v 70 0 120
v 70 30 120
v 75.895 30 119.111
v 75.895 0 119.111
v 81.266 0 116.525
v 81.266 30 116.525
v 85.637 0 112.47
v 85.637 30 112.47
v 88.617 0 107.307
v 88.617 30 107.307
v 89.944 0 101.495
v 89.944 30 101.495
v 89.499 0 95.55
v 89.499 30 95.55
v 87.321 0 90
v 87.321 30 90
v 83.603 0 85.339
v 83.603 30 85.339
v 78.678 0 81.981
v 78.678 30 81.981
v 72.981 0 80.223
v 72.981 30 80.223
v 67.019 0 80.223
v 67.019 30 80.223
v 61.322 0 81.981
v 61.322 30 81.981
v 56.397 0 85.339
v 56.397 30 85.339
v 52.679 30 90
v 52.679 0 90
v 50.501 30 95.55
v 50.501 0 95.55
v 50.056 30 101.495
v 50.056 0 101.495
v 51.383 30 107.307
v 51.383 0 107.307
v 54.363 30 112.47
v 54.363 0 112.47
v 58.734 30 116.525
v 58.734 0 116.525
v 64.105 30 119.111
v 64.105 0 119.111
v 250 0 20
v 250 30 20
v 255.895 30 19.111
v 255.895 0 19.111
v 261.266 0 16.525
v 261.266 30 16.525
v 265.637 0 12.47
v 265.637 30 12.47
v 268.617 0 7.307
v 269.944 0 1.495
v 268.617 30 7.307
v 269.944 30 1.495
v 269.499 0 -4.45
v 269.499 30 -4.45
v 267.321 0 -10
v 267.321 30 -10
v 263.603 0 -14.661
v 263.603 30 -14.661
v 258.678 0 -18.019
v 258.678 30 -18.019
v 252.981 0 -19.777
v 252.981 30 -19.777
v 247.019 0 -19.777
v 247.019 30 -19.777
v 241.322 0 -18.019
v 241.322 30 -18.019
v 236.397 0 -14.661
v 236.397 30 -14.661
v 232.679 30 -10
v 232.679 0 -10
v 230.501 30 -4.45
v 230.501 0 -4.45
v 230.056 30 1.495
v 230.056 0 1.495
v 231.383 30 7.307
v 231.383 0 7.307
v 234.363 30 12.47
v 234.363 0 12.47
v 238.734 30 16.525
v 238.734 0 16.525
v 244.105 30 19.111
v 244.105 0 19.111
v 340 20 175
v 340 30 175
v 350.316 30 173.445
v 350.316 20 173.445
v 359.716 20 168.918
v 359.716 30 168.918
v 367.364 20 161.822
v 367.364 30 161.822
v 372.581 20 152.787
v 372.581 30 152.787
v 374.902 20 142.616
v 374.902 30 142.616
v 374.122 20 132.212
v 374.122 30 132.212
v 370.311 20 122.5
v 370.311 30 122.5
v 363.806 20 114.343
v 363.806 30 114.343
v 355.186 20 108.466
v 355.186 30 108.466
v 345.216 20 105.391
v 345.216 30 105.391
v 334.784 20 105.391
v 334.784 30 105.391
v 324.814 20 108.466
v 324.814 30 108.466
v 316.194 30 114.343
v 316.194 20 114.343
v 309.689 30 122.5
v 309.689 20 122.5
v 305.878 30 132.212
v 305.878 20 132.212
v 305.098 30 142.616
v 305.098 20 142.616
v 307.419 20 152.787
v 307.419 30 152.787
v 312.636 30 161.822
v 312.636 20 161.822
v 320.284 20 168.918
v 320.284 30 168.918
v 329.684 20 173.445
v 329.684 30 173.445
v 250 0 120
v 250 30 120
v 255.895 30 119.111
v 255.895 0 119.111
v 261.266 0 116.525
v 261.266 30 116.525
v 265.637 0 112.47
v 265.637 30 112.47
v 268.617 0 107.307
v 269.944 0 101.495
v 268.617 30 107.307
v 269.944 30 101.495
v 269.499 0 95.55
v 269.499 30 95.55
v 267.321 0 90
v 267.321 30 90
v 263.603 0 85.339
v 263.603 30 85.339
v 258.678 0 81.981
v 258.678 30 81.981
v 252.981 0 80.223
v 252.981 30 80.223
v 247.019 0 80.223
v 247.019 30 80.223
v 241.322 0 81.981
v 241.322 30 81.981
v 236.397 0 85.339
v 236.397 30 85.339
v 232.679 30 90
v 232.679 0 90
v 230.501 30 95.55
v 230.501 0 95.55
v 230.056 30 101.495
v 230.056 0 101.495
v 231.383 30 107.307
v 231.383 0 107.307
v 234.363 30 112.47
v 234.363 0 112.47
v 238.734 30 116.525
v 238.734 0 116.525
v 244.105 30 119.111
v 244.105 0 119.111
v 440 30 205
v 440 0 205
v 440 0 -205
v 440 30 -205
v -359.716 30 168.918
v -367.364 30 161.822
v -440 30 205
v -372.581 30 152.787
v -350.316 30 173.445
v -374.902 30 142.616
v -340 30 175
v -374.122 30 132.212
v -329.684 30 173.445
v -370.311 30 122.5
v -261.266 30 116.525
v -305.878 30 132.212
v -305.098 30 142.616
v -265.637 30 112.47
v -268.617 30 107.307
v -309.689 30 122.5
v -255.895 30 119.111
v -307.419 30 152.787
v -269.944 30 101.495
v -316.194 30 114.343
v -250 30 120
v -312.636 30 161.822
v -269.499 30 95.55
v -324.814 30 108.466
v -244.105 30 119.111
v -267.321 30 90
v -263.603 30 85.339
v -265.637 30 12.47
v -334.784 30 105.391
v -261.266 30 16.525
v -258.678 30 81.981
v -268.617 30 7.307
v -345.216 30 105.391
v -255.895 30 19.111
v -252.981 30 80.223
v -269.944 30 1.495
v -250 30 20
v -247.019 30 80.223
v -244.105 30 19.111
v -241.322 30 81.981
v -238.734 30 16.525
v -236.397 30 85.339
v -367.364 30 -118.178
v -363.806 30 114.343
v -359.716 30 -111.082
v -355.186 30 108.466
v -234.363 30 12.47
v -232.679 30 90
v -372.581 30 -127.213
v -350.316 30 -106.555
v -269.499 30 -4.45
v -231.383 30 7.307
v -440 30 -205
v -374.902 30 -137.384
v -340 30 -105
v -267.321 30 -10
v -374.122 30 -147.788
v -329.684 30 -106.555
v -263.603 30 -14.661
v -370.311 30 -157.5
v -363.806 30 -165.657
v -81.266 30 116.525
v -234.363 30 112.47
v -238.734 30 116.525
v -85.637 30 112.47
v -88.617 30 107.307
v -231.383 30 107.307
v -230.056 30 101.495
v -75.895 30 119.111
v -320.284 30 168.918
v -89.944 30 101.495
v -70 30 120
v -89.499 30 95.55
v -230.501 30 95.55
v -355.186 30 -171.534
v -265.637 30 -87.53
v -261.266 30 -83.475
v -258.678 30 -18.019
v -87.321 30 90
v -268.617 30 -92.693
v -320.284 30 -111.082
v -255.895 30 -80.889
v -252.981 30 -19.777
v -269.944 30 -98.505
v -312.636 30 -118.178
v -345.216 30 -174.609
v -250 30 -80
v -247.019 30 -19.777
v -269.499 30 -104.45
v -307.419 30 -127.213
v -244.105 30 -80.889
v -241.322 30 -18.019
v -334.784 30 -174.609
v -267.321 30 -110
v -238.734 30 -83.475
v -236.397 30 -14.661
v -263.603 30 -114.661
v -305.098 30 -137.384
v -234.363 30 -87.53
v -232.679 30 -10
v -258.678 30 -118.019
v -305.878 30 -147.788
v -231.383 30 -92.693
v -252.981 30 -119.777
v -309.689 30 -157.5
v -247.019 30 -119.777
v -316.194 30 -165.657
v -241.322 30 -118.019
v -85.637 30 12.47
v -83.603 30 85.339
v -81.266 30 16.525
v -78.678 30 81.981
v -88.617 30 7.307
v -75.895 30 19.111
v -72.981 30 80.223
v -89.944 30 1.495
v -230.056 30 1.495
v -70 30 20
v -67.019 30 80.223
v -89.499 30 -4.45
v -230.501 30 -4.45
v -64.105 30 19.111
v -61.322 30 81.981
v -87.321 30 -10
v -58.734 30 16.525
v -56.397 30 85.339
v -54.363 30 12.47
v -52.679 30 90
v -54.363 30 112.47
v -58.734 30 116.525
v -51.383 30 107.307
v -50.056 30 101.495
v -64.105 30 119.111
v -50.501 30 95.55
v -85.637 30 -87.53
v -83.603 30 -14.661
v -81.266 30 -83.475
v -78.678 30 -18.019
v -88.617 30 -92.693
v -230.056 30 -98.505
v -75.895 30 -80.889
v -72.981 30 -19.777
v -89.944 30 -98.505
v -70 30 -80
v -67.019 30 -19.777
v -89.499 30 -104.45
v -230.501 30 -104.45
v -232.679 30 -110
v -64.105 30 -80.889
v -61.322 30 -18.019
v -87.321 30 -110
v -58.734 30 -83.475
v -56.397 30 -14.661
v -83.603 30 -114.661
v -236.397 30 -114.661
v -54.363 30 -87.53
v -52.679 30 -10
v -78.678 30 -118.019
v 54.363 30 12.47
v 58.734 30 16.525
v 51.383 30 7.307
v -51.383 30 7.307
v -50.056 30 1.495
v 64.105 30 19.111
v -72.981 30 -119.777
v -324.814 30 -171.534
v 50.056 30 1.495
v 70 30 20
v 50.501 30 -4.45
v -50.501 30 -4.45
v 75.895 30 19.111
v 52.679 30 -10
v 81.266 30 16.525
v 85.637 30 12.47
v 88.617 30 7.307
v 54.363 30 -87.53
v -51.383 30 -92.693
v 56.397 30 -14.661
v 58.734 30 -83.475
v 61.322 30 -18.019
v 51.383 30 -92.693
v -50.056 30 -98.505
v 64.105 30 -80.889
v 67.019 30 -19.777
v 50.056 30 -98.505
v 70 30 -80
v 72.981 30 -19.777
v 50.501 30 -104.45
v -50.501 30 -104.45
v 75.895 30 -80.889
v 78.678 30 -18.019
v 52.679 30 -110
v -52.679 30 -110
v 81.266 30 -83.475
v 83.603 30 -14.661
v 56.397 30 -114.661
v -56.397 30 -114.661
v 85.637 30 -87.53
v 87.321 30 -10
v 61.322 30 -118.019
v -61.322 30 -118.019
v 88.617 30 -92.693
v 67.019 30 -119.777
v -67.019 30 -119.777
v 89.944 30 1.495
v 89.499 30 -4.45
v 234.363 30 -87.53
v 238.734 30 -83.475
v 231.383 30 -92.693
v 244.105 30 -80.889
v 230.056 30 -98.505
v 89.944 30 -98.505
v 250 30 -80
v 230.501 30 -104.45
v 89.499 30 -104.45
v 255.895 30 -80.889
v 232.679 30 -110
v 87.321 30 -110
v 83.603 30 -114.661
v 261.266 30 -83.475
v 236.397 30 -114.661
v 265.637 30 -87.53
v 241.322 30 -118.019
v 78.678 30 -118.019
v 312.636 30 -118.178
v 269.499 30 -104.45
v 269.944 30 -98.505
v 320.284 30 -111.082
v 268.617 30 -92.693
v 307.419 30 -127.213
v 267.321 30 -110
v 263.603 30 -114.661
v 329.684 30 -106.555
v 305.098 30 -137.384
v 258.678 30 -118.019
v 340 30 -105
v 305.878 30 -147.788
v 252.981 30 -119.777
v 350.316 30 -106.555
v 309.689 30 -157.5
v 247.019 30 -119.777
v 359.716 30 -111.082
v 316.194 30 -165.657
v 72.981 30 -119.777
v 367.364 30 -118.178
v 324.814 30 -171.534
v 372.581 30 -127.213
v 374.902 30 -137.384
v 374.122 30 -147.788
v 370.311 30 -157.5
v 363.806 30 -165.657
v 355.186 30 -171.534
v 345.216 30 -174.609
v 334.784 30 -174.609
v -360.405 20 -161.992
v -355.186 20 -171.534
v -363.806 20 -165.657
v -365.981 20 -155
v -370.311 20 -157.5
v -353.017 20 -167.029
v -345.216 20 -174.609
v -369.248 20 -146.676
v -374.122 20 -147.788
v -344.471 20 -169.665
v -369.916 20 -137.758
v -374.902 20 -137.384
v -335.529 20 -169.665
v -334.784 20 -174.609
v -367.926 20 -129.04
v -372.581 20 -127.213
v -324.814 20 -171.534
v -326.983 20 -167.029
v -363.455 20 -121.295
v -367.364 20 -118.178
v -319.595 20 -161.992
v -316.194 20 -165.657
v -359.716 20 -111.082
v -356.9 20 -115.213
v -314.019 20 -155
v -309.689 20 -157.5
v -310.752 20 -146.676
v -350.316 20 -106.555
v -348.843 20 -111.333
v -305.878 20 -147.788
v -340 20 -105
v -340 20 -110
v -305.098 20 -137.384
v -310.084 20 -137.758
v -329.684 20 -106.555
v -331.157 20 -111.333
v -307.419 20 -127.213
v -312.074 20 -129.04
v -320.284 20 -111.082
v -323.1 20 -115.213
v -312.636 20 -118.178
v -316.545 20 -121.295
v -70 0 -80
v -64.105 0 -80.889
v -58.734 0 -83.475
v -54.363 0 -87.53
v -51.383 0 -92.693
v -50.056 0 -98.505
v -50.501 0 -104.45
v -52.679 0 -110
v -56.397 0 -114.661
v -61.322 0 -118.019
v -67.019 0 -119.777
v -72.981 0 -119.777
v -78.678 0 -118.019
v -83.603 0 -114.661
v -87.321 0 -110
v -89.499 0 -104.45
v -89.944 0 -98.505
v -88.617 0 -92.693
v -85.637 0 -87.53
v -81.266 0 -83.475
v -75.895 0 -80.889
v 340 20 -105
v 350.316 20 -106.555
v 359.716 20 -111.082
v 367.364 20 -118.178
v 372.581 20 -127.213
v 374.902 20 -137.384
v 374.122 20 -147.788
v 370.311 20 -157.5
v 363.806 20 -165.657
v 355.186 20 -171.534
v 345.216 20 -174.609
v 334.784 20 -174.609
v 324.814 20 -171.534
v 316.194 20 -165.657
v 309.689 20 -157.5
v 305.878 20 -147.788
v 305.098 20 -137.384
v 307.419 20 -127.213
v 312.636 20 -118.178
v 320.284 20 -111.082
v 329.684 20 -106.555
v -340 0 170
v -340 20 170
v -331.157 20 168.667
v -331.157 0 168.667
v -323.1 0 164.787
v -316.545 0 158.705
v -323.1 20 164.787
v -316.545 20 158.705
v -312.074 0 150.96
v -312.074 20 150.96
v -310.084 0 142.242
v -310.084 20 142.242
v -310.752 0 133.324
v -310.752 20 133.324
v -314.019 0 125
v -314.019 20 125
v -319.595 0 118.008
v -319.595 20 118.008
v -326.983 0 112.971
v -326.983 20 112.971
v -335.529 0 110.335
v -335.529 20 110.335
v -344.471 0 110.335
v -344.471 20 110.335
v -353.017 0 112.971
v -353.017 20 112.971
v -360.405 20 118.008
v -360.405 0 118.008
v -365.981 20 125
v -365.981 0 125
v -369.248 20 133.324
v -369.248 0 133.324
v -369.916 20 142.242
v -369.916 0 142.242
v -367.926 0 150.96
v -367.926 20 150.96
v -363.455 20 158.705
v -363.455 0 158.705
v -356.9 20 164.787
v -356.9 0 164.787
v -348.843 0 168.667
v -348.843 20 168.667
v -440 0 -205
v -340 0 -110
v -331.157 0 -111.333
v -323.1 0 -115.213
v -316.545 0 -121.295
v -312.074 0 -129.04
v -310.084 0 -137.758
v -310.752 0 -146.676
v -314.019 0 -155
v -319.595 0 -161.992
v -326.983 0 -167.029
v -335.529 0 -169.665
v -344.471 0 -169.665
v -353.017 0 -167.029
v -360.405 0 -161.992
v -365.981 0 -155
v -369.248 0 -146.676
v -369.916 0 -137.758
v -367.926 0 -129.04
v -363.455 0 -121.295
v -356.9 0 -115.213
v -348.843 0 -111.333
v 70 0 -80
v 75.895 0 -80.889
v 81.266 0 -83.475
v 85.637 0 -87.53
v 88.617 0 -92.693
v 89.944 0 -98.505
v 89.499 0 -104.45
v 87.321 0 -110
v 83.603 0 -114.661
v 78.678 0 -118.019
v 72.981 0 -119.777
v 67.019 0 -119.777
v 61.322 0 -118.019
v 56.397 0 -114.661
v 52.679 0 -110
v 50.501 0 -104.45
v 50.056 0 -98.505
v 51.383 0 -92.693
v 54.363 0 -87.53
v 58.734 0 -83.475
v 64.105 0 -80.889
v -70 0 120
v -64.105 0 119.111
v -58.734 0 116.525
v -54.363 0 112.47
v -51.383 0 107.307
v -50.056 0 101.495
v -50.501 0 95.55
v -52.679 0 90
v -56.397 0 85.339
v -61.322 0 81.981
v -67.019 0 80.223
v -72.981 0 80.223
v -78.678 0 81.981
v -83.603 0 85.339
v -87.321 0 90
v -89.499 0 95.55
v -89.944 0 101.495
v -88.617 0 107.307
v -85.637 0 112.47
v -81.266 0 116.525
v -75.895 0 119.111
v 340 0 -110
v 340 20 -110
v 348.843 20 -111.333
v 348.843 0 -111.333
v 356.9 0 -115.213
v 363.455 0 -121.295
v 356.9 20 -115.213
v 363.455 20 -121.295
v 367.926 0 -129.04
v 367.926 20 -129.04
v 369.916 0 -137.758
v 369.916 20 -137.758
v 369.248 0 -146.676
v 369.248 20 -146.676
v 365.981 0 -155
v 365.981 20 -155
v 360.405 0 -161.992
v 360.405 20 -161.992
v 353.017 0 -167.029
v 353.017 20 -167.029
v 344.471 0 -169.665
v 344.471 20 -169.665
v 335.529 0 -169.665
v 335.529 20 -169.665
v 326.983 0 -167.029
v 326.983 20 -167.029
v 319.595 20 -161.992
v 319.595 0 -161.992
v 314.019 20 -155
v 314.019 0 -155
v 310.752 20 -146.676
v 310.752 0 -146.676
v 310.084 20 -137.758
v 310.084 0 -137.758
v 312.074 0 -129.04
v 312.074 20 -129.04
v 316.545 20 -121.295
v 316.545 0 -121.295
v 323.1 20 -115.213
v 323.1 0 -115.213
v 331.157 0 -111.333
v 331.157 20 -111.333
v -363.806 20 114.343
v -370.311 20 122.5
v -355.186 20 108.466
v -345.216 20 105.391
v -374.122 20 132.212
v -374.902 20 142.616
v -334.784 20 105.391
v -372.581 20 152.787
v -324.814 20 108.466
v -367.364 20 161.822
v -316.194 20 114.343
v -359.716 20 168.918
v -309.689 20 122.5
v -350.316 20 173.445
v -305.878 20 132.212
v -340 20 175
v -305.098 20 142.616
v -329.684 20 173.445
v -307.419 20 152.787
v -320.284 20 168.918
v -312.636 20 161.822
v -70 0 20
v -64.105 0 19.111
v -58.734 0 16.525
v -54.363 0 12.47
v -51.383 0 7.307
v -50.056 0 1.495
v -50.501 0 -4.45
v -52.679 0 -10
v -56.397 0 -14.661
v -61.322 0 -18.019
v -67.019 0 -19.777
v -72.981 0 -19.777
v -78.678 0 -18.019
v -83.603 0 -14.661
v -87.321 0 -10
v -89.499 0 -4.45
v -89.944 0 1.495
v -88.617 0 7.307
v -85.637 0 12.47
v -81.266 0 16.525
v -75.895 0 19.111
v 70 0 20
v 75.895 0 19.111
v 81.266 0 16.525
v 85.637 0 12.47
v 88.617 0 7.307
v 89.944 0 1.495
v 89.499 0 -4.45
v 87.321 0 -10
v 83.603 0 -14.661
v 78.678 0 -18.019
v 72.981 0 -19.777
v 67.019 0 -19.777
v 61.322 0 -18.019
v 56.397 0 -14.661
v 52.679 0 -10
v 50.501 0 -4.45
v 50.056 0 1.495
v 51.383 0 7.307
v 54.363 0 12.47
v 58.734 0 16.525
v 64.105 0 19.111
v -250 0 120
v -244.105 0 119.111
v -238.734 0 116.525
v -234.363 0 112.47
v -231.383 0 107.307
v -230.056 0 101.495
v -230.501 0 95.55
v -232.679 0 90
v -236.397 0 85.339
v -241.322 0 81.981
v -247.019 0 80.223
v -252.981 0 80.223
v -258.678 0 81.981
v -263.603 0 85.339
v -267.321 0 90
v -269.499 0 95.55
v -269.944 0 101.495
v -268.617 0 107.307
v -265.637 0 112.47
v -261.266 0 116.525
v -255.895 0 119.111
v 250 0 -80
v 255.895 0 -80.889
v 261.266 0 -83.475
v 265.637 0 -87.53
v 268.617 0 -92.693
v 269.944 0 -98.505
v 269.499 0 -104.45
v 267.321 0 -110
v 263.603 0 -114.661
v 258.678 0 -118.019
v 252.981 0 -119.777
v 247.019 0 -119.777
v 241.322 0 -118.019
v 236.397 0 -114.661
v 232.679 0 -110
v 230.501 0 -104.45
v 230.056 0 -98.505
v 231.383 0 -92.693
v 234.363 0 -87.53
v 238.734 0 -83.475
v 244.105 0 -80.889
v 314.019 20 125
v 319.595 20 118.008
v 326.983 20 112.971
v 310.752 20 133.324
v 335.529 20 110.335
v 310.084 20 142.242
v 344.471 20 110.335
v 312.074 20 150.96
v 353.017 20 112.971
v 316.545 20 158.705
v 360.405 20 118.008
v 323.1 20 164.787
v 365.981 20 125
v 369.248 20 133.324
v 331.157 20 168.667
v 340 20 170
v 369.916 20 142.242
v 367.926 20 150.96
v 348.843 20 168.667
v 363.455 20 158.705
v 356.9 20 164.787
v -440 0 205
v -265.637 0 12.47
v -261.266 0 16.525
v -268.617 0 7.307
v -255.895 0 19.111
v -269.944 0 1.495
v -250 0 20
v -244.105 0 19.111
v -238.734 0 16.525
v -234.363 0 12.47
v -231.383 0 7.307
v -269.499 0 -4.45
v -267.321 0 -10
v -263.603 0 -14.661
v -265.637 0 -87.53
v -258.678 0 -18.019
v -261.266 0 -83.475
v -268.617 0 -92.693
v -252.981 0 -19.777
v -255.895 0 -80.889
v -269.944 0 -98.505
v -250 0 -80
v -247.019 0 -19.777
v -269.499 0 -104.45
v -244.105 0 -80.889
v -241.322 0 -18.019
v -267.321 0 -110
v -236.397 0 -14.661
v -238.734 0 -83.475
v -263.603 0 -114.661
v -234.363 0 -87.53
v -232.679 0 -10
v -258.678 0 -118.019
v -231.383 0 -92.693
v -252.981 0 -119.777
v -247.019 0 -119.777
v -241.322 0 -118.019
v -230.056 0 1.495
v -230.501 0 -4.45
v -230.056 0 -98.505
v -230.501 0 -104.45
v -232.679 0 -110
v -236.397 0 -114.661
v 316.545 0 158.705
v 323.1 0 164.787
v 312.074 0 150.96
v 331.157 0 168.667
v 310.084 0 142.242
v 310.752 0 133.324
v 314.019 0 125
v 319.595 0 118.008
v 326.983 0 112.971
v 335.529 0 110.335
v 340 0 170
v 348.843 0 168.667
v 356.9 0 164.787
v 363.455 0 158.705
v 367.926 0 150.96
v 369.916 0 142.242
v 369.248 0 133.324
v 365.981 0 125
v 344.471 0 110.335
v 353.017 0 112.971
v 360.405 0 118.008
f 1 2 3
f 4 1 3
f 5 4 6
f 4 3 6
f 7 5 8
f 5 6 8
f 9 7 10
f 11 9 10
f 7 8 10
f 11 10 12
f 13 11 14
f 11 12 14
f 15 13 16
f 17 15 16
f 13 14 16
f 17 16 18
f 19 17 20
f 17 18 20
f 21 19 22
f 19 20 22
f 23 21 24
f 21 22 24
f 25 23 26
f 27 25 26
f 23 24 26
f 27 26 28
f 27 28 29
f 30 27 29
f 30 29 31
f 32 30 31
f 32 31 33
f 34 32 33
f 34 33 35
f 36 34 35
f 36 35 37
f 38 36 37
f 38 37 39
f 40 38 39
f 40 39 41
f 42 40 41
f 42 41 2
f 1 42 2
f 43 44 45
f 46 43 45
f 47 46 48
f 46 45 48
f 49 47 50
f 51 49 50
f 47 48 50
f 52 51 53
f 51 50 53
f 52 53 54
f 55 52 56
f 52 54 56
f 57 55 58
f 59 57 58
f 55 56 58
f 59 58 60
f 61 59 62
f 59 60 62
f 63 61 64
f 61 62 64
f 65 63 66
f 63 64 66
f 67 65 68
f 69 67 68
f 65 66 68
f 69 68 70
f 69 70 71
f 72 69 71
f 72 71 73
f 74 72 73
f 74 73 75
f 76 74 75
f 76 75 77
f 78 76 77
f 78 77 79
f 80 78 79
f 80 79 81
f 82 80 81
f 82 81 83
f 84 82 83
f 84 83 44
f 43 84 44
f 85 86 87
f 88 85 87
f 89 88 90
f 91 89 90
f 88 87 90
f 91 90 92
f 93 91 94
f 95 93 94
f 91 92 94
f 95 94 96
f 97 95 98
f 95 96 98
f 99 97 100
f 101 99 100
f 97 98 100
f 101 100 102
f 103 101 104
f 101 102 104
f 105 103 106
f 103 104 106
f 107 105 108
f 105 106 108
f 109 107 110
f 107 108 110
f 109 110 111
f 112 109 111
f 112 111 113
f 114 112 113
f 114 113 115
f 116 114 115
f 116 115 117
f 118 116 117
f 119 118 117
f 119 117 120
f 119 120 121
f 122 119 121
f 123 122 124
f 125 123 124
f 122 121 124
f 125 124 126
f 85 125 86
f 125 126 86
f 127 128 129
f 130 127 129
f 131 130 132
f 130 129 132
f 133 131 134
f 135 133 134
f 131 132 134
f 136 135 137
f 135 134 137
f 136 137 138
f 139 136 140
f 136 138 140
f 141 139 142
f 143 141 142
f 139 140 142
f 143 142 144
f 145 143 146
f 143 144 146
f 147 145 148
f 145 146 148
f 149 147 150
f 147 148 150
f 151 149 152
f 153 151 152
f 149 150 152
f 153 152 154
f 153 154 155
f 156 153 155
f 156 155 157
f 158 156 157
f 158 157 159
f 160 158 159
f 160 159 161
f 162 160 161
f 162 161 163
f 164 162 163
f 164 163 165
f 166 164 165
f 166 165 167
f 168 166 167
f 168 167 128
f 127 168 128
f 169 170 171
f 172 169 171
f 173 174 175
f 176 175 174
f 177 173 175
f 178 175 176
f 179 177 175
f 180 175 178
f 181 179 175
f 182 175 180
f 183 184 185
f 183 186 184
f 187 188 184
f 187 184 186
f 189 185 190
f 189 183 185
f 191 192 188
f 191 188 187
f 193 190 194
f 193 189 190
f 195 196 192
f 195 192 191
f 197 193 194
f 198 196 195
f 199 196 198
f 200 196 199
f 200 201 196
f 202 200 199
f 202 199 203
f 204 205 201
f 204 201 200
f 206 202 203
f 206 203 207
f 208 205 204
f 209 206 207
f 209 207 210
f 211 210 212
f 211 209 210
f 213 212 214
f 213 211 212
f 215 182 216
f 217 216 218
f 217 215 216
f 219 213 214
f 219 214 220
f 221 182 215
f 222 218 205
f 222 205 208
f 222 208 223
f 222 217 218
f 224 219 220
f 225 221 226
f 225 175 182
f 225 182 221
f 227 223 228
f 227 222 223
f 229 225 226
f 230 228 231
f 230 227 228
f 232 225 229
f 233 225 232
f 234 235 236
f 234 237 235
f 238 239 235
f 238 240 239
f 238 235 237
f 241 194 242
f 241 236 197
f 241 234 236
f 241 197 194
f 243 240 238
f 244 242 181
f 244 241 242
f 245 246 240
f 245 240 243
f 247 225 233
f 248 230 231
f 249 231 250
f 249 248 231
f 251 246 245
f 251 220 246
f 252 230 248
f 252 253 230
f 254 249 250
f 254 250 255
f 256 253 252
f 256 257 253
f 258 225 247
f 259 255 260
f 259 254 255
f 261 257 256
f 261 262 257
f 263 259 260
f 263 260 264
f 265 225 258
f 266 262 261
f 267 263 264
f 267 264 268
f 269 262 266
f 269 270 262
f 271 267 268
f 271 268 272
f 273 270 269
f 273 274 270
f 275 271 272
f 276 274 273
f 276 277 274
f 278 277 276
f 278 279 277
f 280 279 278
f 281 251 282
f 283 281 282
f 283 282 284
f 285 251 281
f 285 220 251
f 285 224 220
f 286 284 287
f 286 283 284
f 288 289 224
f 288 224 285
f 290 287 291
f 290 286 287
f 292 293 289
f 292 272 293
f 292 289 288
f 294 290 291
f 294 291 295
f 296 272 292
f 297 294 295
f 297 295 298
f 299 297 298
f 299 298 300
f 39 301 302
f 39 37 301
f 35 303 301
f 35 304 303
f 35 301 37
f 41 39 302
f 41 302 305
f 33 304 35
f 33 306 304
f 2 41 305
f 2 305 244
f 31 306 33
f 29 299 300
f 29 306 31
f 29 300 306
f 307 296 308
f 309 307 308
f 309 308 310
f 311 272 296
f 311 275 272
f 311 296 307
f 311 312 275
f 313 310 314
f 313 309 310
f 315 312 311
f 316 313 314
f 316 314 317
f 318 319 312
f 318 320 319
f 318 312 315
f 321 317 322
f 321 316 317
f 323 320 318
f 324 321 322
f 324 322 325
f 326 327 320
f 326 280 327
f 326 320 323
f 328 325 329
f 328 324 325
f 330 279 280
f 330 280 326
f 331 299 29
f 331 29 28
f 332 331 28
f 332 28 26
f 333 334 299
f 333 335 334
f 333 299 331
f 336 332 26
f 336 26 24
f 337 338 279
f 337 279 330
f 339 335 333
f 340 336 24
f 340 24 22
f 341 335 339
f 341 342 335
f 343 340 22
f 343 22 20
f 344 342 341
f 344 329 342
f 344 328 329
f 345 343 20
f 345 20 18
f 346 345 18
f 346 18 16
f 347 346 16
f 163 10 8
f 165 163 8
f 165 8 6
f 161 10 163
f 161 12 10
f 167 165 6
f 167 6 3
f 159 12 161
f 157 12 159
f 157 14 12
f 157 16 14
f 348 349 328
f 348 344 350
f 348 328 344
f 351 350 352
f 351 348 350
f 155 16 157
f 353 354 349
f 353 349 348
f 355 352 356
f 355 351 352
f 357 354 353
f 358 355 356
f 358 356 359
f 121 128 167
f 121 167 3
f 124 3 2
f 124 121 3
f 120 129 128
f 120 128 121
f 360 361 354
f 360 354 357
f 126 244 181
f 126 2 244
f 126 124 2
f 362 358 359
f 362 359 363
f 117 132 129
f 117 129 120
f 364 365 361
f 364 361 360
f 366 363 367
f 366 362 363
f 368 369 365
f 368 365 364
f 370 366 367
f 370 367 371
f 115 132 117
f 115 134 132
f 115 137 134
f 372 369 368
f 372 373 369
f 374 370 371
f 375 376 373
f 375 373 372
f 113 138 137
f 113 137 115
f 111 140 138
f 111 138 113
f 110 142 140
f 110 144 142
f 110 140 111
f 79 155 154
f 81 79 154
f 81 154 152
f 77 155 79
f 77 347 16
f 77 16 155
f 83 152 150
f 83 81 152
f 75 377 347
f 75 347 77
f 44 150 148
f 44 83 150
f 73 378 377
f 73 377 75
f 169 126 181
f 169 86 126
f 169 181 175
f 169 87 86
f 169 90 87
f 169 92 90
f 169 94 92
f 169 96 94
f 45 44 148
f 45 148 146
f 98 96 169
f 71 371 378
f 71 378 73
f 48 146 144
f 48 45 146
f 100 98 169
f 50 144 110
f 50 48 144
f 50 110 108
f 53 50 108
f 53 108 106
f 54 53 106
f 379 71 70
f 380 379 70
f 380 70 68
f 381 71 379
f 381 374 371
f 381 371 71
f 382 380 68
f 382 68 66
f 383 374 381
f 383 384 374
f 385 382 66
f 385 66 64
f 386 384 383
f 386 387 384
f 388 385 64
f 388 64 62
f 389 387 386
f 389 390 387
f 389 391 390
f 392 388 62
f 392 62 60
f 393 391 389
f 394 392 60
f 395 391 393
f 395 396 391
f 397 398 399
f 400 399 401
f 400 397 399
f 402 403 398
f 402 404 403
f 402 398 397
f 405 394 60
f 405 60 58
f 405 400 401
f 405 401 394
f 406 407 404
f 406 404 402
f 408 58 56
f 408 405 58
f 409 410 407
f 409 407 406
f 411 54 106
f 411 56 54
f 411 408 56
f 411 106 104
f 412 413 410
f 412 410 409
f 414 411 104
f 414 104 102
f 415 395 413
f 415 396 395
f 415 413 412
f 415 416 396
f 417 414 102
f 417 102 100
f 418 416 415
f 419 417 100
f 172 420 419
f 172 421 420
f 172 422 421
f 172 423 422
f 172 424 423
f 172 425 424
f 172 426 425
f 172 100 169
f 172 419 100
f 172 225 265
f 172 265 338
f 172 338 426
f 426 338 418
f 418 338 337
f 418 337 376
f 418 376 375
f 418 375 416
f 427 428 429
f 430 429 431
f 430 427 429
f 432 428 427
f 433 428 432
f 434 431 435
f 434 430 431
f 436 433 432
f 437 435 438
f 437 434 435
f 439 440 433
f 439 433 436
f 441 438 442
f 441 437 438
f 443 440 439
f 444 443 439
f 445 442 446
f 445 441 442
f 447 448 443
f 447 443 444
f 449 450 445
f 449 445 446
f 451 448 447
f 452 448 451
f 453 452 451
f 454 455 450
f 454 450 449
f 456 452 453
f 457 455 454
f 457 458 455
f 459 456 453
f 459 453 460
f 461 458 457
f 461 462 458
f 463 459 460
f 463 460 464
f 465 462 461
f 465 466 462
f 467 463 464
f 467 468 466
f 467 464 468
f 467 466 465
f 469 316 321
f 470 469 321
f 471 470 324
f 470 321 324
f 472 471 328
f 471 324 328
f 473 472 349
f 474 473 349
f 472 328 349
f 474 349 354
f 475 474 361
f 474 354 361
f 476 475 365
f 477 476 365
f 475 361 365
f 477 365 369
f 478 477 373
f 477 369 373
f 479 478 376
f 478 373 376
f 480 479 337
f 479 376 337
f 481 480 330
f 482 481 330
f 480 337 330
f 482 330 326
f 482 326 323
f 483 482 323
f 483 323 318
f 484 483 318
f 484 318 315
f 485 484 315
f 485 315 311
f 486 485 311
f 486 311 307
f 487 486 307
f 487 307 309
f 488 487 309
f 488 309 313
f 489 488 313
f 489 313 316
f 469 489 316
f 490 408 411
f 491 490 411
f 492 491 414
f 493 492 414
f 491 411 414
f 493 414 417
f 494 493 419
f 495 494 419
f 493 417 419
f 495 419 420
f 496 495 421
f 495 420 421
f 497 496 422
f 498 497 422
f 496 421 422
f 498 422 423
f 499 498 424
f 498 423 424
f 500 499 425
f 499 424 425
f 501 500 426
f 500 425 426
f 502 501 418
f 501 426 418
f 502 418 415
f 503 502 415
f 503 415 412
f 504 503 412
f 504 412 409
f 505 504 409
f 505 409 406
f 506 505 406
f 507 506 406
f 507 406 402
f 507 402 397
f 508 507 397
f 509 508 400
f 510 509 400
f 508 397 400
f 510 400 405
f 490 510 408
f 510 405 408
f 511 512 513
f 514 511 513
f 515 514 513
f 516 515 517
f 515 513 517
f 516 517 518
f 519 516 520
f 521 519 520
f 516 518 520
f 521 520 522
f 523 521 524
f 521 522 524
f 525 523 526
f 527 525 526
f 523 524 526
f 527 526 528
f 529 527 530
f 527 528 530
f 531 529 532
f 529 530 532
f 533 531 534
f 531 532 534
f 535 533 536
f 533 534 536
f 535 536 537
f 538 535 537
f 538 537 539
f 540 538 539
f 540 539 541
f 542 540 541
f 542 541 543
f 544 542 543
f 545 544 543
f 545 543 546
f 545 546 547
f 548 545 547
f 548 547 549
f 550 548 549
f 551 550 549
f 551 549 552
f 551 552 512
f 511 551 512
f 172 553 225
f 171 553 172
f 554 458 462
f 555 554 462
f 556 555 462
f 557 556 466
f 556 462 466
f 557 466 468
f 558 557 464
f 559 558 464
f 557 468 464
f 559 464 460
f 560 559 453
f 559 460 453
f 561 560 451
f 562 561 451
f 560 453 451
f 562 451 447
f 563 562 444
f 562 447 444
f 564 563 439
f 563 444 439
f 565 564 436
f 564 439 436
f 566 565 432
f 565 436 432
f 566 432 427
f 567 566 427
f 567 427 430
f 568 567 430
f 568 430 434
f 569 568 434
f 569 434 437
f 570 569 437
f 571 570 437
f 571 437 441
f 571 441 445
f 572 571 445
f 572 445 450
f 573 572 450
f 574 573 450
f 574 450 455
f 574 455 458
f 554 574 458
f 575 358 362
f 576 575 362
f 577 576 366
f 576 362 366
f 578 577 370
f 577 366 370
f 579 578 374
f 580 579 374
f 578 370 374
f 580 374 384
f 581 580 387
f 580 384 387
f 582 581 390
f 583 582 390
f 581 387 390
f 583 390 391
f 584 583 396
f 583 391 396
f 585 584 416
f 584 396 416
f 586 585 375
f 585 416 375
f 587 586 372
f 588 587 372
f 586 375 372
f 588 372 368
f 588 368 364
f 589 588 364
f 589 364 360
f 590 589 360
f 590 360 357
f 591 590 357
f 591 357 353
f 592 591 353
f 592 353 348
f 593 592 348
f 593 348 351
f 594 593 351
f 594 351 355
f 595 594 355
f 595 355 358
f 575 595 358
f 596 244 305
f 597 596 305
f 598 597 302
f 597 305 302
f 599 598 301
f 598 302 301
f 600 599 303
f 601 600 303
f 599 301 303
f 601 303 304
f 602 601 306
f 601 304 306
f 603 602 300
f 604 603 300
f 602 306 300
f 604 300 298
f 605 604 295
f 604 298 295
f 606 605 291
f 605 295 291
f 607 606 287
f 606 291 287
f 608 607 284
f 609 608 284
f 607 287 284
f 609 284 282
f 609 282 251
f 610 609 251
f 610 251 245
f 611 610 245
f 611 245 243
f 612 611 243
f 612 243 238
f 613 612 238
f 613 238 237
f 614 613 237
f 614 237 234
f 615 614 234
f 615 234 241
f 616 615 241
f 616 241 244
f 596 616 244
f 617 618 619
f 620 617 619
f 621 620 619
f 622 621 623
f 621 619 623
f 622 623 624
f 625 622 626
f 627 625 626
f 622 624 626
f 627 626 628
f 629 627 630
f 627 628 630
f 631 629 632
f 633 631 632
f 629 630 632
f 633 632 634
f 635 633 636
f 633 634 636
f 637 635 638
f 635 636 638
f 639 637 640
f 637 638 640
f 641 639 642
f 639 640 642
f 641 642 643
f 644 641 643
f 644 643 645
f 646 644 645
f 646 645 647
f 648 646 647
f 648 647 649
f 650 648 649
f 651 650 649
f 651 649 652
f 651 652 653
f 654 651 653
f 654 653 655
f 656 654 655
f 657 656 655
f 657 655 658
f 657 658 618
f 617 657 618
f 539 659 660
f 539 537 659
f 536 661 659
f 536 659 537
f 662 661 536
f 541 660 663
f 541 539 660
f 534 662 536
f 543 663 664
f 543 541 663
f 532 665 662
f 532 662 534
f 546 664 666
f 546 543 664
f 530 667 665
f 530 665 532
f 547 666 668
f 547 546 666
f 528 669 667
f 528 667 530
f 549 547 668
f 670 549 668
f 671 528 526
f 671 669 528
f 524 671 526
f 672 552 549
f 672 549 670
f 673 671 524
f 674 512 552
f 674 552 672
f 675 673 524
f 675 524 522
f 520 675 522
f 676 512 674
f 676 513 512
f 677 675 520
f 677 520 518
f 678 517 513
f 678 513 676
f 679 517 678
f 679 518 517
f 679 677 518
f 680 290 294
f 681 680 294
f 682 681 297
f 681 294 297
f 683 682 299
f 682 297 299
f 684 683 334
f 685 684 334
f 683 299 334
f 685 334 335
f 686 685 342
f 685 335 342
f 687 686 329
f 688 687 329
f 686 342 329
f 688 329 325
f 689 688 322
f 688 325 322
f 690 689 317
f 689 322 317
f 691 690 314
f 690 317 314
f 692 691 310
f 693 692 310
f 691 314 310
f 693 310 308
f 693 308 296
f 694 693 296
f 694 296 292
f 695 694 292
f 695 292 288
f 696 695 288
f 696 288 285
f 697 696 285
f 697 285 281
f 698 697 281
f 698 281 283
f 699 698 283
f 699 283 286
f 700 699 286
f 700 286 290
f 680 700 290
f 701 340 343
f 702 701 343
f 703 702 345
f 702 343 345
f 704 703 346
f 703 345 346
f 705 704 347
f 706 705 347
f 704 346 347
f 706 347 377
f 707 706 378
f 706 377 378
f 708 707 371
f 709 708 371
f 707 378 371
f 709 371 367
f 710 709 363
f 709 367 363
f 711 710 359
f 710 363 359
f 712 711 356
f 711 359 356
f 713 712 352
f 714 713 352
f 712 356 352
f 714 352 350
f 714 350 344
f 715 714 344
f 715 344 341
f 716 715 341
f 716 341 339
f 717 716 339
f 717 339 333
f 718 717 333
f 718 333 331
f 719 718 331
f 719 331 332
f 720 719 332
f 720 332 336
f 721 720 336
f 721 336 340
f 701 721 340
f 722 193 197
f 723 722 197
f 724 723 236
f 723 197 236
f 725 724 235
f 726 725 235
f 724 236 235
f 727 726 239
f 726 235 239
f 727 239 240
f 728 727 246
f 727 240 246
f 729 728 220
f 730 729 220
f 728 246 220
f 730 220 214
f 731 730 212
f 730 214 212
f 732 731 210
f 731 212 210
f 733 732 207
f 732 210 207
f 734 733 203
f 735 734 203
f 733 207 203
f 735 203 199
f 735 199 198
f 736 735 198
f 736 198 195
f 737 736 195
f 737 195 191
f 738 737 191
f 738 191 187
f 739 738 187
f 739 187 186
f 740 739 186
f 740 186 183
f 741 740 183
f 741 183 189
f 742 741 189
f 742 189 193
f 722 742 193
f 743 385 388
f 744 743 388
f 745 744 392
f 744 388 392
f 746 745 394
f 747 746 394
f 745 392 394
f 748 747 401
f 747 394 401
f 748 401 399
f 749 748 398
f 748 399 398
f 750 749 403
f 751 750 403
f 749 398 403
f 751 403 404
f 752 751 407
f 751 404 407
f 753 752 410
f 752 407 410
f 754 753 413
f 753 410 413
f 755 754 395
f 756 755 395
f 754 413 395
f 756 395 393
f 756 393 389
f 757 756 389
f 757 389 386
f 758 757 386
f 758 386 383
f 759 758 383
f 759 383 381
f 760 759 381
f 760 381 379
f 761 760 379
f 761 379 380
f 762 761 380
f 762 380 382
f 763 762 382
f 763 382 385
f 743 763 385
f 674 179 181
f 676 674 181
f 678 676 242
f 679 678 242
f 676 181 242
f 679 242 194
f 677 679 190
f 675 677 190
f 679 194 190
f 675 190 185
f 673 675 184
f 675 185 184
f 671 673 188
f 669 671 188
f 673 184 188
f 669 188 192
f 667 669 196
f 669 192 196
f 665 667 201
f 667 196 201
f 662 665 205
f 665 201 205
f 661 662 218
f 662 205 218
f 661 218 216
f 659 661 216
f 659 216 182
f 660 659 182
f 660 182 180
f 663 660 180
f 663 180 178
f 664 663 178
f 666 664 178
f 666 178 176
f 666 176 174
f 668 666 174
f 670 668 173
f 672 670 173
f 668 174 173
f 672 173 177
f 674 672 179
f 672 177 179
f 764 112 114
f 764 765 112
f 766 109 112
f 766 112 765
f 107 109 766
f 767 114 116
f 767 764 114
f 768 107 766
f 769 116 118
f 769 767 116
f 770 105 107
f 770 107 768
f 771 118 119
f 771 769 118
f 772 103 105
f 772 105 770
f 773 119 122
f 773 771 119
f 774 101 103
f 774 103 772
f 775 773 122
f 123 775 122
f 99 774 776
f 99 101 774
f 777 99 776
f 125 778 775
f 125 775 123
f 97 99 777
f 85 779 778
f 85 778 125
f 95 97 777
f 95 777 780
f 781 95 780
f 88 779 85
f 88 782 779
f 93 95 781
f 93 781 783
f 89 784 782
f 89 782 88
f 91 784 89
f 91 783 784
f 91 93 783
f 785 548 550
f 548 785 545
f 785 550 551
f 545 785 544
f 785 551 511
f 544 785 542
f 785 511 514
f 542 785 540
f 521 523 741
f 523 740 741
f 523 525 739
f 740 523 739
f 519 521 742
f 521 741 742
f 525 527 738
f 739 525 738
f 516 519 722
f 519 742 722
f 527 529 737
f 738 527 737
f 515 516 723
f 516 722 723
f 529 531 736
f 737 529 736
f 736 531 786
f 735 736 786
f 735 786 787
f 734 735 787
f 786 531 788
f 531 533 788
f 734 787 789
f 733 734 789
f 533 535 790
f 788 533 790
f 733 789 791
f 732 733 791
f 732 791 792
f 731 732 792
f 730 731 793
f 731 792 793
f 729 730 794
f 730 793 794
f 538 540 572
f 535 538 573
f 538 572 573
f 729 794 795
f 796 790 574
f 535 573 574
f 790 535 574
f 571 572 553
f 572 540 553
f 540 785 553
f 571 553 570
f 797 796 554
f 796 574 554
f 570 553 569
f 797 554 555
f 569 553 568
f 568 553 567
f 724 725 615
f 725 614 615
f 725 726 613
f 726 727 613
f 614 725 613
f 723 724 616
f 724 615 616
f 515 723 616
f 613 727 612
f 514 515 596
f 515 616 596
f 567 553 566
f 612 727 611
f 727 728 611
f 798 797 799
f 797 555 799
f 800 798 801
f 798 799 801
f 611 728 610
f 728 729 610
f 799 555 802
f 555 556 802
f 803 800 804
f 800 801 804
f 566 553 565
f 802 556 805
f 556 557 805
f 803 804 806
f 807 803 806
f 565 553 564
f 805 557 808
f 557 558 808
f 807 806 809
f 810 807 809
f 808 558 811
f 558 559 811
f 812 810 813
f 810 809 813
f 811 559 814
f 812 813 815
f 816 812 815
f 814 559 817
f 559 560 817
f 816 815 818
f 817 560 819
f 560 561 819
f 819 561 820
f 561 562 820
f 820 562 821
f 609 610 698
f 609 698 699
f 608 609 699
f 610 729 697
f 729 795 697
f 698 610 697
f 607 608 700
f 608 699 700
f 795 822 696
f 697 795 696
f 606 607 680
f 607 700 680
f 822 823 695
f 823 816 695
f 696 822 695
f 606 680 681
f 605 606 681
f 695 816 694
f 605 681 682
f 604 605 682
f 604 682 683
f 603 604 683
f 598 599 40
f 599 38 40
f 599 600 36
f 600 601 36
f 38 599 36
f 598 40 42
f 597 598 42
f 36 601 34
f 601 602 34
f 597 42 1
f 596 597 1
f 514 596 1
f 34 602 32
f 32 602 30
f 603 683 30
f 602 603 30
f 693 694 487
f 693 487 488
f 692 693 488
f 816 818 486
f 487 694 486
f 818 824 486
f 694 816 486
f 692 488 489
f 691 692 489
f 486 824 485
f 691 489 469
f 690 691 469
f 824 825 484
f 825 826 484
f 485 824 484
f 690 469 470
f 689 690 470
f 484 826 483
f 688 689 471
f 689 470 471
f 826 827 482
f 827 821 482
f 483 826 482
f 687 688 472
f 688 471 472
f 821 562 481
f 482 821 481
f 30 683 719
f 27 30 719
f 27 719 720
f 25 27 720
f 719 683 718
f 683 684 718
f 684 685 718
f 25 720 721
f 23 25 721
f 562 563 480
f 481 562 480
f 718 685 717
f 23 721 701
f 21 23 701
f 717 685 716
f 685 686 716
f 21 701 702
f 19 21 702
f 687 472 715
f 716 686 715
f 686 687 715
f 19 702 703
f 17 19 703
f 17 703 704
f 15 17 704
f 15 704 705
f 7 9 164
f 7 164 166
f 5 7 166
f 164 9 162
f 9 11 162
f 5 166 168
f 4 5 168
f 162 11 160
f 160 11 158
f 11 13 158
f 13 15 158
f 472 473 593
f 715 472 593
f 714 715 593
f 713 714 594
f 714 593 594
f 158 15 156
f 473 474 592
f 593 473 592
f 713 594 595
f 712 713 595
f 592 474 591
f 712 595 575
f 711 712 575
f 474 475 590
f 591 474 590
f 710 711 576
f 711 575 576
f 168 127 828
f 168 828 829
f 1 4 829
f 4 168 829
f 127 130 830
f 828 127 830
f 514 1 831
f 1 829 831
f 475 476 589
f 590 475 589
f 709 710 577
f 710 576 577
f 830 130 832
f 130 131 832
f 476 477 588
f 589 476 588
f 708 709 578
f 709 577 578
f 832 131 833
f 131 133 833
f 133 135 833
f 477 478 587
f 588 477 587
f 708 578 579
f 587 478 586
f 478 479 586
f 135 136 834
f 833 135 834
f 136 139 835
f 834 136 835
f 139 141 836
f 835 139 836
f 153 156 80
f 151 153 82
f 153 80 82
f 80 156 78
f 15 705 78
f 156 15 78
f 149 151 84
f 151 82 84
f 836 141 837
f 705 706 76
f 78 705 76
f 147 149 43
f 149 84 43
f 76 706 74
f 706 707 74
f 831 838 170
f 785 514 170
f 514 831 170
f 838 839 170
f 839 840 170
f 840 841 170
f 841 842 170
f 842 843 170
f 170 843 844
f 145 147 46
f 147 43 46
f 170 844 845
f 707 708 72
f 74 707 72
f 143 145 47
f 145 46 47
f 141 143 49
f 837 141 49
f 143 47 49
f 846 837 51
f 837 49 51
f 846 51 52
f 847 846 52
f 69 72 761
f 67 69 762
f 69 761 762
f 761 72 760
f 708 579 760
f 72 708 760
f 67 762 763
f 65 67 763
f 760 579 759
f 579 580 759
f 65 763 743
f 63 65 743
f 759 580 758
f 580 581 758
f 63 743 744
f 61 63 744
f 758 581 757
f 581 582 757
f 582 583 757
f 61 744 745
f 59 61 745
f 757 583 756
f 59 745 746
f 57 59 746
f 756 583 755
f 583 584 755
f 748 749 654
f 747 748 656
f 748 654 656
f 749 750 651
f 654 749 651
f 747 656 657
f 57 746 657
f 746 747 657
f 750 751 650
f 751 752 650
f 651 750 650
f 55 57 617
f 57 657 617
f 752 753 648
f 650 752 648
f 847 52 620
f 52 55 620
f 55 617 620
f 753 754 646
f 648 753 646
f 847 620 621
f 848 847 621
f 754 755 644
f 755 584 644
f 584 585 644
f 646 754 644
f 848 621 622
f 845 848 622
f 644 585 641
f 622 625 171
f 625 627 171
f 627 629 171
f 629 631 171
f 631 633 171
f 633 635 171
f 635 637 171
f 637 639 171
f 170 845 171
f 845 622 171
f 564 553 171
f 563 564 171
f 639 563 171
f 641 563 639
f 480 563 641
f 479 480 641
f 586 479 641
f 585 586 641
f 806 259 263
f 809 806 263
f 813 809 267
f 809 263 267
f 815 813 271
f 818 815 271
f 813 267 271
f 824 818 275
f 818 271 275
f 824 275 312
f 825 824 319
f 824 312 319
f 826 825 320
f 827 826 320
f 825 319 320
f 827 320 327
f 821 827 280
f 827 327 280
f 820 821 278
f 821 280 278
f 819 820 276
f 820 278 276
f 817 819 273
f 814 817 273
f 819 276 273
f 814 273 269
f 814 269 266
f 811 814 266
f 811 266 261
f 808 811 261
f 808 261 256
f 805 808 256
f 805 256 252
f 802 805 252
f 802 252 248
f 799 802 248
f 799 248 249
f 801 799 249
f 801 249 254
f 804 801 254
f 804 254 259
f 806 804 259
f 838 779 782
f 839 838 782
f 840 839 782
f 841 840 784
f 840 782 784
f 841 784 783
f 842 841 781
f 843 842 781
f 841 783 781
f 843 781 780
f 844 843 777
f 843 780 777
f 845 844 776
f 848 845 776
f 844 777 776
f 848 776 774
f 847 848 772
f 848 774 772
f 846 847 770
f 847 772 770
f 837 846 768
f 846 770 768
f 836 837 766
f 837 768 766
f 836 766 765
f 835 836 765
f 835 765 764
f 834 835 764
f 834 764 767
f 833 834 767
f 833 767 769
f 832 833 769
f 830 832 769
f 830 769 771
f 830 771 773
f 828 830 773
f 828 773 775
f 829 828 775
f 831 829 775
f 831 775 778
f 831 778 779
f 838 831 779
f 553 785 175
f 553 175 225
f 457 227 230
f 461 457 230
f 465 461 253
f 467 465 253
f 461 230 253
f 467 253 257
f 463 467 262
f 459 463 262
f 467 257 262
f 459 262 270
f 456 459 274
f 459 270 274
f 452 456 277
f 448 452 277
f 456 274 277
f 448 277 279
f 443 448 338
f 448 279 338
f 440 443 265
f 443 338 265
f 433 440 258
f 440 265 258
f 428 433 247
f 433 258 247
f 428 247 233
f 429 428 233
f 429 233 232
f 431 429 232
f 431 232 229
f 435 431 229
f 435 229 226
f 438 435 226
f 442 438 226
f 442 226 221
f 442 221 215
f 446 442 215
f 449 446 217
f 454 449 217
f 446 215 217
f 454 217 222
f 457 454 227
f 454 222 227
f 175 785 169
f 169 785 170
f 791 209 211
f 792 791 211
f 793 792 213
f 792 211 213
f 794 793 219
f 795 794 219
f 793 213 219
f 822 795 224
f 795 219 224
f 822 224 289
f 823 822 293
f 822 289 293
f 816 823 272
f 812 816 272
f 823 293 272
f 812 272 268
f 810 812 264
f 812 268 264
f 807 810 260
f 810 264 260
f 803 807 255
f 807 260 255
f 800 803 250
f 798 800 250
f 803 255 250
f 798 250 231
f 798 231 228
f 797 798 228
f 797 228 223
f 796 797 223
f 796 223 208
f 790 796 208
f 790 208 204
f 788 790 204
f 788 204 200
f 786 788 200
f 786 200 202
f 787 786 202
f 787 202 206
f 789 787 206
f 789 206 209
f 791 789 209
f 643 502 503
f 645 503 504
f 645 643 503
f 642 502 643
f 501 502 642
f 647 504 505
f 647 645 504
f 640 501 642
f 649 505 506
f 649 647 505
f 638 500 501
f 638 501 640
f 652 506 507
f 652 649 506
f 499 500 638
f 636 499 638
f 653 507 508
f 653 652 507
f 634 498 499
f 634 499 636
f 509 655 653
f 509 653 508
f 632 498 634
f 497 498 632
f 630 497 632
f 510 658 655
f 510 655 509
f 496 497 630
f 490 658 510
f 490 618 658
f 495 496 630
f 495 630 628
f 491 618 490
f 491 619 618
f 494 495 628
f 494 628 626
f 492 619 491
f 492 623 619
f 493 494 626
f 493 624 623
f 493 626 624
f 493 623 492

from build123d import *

# Parameters (mm, degrees)
SKETCH1_W           = 880
SKETCH1_H           = 410
BOSS_EXTRUDE1_DEPTH = 30
SKETCH2_R           = 30
CUT_EXTRUDE1_DEPTH  = 225
SKETCH3_R           = 35
CUT_EXTRUDE2_DEPTH  = 10
SKETCH4_R           = 20
CUT_EXTRUDE3_DEPTH  = 154


with BuildPart() as part:
    # Sketch1 → Boss-Extrude1 (new body)
    with BuildSketch(Plane(origin=(0, 0, 0), x_dir=(1, 0, 0), z_dir=(0, 1, 0))):
        Rectangle(SKETCH1_W, SKETCH1_H)
    extrude(amount=BOSS_EXTRUDE1_DEPTH)

    # Sketch2 → Cut-Extrude1 (cut)
    with BuildSketch(Plane(origin=(0, 30, 0), x_dir=(1, 0, 0), z_dir=(0, 1, 0))):
        with Locations(Location((-340, 140, 0), (0, 0, 270))):
            Circle(SKETCH2_R)
        with Locations(Location((340, 140, 0), (0, 0, 270))):
            Circle(SKETCH2_R)
        with Locations(Location((340, -140, 0), (0, 0, 270))):
            Circle(SKETCH2_R)
        with Locations(Location((-340, -140, 0), (0, 0, 270))):
            Circle(SKETCH2_R)
    extrude(amount=-CUT_EXTRUDE1_DEPTH, mode=Mode.SUBTRACT)

    # Sketch3 → Cut-Extrude2 (cut)
    with BuildSketch(Plane(origin=(0, 30, 0), x_dir=(1, 0, 0), z_dir=(0, 1, 0))):
        with Locations(Location((-340, 140, 0), (0, 0, 270))):
            Circle(SKETCH3_R)
        with Locations((-340, -540)):
            Circle(SKETCH3_R)
        with Locations((-340, -820)):
            Circle(SKETCH3_R)
        with Locations(Location((-340, -140, 0), (0, 0, 270))):
            Circle(SKETCH3_R)
        with Locations(Location((340, 140, 0), (0, 0, 270))):
            Circle(SKETCH3_R)
        with Locations(Location((340, -140, 0), (0, 0, 270))):
            Circle(SKETCH3_R)
    extrude(amount=-CUT_EXTRUDE2_DEPTH, mode=Mode.SUBTRACT)

    # Sketch4 → Cut-Extrude3 (cut)
    with BuildSketch(Plane(origin=(0, 30, 0), x_dir=(1, 0, 0), z_dir=(0, 1, 0))):
        with Locations(Location((-250, 0, 0), (0, 0, 270))):
            Circle(SKETCH4_R)
        with Locations(Location((-70, 0, 0), (0, 0, 270))):
            Circle(SKETCH4_R)
        with Locations(Location((-250, 100, 0), (0, 0, 270))):
            Circle(SKETCH4_R)
        with Locations(Location((-250, -100, 0), (0, 0, 270))):
            Circle(SKETCH4_R)
        with Locations(Location((-70, 100, 0), (0, 0, 270))):
            Circle(SKETCH4_R)
        with Locations(Location((-70, -100, 0), (0, 0, 270))):
            Circle(SKETCH4_R)
        with Locations(Location((70, -100, 0), (0, 0, 270))):
            Circle(SKETCH4_R)
        with Locations(Location((70, 100, 0), (0, 0, 270))):
            Circle(SKETCH4_R)
        with Locations(Location((250, -100, 0), (0, 0, 270))):
            Circle(SKETCH4_R)
        with Locations(Location((250, 100, 0), (0, 0, 270))):
            Circle(SKETCH4_R)
        with Locations(Location((70, 0, 0), (0, 0, 270))):
            Circle(SKETCH4_R)
        with Locations(Location((250, 0, 0), (0, 0, 270))):
            Circle(SKETCH4_R)
    extrude(amount=-CUT_EXTRUDE3_DEPTH, mode=Mode.SUBTRACT)


solid = part.part
